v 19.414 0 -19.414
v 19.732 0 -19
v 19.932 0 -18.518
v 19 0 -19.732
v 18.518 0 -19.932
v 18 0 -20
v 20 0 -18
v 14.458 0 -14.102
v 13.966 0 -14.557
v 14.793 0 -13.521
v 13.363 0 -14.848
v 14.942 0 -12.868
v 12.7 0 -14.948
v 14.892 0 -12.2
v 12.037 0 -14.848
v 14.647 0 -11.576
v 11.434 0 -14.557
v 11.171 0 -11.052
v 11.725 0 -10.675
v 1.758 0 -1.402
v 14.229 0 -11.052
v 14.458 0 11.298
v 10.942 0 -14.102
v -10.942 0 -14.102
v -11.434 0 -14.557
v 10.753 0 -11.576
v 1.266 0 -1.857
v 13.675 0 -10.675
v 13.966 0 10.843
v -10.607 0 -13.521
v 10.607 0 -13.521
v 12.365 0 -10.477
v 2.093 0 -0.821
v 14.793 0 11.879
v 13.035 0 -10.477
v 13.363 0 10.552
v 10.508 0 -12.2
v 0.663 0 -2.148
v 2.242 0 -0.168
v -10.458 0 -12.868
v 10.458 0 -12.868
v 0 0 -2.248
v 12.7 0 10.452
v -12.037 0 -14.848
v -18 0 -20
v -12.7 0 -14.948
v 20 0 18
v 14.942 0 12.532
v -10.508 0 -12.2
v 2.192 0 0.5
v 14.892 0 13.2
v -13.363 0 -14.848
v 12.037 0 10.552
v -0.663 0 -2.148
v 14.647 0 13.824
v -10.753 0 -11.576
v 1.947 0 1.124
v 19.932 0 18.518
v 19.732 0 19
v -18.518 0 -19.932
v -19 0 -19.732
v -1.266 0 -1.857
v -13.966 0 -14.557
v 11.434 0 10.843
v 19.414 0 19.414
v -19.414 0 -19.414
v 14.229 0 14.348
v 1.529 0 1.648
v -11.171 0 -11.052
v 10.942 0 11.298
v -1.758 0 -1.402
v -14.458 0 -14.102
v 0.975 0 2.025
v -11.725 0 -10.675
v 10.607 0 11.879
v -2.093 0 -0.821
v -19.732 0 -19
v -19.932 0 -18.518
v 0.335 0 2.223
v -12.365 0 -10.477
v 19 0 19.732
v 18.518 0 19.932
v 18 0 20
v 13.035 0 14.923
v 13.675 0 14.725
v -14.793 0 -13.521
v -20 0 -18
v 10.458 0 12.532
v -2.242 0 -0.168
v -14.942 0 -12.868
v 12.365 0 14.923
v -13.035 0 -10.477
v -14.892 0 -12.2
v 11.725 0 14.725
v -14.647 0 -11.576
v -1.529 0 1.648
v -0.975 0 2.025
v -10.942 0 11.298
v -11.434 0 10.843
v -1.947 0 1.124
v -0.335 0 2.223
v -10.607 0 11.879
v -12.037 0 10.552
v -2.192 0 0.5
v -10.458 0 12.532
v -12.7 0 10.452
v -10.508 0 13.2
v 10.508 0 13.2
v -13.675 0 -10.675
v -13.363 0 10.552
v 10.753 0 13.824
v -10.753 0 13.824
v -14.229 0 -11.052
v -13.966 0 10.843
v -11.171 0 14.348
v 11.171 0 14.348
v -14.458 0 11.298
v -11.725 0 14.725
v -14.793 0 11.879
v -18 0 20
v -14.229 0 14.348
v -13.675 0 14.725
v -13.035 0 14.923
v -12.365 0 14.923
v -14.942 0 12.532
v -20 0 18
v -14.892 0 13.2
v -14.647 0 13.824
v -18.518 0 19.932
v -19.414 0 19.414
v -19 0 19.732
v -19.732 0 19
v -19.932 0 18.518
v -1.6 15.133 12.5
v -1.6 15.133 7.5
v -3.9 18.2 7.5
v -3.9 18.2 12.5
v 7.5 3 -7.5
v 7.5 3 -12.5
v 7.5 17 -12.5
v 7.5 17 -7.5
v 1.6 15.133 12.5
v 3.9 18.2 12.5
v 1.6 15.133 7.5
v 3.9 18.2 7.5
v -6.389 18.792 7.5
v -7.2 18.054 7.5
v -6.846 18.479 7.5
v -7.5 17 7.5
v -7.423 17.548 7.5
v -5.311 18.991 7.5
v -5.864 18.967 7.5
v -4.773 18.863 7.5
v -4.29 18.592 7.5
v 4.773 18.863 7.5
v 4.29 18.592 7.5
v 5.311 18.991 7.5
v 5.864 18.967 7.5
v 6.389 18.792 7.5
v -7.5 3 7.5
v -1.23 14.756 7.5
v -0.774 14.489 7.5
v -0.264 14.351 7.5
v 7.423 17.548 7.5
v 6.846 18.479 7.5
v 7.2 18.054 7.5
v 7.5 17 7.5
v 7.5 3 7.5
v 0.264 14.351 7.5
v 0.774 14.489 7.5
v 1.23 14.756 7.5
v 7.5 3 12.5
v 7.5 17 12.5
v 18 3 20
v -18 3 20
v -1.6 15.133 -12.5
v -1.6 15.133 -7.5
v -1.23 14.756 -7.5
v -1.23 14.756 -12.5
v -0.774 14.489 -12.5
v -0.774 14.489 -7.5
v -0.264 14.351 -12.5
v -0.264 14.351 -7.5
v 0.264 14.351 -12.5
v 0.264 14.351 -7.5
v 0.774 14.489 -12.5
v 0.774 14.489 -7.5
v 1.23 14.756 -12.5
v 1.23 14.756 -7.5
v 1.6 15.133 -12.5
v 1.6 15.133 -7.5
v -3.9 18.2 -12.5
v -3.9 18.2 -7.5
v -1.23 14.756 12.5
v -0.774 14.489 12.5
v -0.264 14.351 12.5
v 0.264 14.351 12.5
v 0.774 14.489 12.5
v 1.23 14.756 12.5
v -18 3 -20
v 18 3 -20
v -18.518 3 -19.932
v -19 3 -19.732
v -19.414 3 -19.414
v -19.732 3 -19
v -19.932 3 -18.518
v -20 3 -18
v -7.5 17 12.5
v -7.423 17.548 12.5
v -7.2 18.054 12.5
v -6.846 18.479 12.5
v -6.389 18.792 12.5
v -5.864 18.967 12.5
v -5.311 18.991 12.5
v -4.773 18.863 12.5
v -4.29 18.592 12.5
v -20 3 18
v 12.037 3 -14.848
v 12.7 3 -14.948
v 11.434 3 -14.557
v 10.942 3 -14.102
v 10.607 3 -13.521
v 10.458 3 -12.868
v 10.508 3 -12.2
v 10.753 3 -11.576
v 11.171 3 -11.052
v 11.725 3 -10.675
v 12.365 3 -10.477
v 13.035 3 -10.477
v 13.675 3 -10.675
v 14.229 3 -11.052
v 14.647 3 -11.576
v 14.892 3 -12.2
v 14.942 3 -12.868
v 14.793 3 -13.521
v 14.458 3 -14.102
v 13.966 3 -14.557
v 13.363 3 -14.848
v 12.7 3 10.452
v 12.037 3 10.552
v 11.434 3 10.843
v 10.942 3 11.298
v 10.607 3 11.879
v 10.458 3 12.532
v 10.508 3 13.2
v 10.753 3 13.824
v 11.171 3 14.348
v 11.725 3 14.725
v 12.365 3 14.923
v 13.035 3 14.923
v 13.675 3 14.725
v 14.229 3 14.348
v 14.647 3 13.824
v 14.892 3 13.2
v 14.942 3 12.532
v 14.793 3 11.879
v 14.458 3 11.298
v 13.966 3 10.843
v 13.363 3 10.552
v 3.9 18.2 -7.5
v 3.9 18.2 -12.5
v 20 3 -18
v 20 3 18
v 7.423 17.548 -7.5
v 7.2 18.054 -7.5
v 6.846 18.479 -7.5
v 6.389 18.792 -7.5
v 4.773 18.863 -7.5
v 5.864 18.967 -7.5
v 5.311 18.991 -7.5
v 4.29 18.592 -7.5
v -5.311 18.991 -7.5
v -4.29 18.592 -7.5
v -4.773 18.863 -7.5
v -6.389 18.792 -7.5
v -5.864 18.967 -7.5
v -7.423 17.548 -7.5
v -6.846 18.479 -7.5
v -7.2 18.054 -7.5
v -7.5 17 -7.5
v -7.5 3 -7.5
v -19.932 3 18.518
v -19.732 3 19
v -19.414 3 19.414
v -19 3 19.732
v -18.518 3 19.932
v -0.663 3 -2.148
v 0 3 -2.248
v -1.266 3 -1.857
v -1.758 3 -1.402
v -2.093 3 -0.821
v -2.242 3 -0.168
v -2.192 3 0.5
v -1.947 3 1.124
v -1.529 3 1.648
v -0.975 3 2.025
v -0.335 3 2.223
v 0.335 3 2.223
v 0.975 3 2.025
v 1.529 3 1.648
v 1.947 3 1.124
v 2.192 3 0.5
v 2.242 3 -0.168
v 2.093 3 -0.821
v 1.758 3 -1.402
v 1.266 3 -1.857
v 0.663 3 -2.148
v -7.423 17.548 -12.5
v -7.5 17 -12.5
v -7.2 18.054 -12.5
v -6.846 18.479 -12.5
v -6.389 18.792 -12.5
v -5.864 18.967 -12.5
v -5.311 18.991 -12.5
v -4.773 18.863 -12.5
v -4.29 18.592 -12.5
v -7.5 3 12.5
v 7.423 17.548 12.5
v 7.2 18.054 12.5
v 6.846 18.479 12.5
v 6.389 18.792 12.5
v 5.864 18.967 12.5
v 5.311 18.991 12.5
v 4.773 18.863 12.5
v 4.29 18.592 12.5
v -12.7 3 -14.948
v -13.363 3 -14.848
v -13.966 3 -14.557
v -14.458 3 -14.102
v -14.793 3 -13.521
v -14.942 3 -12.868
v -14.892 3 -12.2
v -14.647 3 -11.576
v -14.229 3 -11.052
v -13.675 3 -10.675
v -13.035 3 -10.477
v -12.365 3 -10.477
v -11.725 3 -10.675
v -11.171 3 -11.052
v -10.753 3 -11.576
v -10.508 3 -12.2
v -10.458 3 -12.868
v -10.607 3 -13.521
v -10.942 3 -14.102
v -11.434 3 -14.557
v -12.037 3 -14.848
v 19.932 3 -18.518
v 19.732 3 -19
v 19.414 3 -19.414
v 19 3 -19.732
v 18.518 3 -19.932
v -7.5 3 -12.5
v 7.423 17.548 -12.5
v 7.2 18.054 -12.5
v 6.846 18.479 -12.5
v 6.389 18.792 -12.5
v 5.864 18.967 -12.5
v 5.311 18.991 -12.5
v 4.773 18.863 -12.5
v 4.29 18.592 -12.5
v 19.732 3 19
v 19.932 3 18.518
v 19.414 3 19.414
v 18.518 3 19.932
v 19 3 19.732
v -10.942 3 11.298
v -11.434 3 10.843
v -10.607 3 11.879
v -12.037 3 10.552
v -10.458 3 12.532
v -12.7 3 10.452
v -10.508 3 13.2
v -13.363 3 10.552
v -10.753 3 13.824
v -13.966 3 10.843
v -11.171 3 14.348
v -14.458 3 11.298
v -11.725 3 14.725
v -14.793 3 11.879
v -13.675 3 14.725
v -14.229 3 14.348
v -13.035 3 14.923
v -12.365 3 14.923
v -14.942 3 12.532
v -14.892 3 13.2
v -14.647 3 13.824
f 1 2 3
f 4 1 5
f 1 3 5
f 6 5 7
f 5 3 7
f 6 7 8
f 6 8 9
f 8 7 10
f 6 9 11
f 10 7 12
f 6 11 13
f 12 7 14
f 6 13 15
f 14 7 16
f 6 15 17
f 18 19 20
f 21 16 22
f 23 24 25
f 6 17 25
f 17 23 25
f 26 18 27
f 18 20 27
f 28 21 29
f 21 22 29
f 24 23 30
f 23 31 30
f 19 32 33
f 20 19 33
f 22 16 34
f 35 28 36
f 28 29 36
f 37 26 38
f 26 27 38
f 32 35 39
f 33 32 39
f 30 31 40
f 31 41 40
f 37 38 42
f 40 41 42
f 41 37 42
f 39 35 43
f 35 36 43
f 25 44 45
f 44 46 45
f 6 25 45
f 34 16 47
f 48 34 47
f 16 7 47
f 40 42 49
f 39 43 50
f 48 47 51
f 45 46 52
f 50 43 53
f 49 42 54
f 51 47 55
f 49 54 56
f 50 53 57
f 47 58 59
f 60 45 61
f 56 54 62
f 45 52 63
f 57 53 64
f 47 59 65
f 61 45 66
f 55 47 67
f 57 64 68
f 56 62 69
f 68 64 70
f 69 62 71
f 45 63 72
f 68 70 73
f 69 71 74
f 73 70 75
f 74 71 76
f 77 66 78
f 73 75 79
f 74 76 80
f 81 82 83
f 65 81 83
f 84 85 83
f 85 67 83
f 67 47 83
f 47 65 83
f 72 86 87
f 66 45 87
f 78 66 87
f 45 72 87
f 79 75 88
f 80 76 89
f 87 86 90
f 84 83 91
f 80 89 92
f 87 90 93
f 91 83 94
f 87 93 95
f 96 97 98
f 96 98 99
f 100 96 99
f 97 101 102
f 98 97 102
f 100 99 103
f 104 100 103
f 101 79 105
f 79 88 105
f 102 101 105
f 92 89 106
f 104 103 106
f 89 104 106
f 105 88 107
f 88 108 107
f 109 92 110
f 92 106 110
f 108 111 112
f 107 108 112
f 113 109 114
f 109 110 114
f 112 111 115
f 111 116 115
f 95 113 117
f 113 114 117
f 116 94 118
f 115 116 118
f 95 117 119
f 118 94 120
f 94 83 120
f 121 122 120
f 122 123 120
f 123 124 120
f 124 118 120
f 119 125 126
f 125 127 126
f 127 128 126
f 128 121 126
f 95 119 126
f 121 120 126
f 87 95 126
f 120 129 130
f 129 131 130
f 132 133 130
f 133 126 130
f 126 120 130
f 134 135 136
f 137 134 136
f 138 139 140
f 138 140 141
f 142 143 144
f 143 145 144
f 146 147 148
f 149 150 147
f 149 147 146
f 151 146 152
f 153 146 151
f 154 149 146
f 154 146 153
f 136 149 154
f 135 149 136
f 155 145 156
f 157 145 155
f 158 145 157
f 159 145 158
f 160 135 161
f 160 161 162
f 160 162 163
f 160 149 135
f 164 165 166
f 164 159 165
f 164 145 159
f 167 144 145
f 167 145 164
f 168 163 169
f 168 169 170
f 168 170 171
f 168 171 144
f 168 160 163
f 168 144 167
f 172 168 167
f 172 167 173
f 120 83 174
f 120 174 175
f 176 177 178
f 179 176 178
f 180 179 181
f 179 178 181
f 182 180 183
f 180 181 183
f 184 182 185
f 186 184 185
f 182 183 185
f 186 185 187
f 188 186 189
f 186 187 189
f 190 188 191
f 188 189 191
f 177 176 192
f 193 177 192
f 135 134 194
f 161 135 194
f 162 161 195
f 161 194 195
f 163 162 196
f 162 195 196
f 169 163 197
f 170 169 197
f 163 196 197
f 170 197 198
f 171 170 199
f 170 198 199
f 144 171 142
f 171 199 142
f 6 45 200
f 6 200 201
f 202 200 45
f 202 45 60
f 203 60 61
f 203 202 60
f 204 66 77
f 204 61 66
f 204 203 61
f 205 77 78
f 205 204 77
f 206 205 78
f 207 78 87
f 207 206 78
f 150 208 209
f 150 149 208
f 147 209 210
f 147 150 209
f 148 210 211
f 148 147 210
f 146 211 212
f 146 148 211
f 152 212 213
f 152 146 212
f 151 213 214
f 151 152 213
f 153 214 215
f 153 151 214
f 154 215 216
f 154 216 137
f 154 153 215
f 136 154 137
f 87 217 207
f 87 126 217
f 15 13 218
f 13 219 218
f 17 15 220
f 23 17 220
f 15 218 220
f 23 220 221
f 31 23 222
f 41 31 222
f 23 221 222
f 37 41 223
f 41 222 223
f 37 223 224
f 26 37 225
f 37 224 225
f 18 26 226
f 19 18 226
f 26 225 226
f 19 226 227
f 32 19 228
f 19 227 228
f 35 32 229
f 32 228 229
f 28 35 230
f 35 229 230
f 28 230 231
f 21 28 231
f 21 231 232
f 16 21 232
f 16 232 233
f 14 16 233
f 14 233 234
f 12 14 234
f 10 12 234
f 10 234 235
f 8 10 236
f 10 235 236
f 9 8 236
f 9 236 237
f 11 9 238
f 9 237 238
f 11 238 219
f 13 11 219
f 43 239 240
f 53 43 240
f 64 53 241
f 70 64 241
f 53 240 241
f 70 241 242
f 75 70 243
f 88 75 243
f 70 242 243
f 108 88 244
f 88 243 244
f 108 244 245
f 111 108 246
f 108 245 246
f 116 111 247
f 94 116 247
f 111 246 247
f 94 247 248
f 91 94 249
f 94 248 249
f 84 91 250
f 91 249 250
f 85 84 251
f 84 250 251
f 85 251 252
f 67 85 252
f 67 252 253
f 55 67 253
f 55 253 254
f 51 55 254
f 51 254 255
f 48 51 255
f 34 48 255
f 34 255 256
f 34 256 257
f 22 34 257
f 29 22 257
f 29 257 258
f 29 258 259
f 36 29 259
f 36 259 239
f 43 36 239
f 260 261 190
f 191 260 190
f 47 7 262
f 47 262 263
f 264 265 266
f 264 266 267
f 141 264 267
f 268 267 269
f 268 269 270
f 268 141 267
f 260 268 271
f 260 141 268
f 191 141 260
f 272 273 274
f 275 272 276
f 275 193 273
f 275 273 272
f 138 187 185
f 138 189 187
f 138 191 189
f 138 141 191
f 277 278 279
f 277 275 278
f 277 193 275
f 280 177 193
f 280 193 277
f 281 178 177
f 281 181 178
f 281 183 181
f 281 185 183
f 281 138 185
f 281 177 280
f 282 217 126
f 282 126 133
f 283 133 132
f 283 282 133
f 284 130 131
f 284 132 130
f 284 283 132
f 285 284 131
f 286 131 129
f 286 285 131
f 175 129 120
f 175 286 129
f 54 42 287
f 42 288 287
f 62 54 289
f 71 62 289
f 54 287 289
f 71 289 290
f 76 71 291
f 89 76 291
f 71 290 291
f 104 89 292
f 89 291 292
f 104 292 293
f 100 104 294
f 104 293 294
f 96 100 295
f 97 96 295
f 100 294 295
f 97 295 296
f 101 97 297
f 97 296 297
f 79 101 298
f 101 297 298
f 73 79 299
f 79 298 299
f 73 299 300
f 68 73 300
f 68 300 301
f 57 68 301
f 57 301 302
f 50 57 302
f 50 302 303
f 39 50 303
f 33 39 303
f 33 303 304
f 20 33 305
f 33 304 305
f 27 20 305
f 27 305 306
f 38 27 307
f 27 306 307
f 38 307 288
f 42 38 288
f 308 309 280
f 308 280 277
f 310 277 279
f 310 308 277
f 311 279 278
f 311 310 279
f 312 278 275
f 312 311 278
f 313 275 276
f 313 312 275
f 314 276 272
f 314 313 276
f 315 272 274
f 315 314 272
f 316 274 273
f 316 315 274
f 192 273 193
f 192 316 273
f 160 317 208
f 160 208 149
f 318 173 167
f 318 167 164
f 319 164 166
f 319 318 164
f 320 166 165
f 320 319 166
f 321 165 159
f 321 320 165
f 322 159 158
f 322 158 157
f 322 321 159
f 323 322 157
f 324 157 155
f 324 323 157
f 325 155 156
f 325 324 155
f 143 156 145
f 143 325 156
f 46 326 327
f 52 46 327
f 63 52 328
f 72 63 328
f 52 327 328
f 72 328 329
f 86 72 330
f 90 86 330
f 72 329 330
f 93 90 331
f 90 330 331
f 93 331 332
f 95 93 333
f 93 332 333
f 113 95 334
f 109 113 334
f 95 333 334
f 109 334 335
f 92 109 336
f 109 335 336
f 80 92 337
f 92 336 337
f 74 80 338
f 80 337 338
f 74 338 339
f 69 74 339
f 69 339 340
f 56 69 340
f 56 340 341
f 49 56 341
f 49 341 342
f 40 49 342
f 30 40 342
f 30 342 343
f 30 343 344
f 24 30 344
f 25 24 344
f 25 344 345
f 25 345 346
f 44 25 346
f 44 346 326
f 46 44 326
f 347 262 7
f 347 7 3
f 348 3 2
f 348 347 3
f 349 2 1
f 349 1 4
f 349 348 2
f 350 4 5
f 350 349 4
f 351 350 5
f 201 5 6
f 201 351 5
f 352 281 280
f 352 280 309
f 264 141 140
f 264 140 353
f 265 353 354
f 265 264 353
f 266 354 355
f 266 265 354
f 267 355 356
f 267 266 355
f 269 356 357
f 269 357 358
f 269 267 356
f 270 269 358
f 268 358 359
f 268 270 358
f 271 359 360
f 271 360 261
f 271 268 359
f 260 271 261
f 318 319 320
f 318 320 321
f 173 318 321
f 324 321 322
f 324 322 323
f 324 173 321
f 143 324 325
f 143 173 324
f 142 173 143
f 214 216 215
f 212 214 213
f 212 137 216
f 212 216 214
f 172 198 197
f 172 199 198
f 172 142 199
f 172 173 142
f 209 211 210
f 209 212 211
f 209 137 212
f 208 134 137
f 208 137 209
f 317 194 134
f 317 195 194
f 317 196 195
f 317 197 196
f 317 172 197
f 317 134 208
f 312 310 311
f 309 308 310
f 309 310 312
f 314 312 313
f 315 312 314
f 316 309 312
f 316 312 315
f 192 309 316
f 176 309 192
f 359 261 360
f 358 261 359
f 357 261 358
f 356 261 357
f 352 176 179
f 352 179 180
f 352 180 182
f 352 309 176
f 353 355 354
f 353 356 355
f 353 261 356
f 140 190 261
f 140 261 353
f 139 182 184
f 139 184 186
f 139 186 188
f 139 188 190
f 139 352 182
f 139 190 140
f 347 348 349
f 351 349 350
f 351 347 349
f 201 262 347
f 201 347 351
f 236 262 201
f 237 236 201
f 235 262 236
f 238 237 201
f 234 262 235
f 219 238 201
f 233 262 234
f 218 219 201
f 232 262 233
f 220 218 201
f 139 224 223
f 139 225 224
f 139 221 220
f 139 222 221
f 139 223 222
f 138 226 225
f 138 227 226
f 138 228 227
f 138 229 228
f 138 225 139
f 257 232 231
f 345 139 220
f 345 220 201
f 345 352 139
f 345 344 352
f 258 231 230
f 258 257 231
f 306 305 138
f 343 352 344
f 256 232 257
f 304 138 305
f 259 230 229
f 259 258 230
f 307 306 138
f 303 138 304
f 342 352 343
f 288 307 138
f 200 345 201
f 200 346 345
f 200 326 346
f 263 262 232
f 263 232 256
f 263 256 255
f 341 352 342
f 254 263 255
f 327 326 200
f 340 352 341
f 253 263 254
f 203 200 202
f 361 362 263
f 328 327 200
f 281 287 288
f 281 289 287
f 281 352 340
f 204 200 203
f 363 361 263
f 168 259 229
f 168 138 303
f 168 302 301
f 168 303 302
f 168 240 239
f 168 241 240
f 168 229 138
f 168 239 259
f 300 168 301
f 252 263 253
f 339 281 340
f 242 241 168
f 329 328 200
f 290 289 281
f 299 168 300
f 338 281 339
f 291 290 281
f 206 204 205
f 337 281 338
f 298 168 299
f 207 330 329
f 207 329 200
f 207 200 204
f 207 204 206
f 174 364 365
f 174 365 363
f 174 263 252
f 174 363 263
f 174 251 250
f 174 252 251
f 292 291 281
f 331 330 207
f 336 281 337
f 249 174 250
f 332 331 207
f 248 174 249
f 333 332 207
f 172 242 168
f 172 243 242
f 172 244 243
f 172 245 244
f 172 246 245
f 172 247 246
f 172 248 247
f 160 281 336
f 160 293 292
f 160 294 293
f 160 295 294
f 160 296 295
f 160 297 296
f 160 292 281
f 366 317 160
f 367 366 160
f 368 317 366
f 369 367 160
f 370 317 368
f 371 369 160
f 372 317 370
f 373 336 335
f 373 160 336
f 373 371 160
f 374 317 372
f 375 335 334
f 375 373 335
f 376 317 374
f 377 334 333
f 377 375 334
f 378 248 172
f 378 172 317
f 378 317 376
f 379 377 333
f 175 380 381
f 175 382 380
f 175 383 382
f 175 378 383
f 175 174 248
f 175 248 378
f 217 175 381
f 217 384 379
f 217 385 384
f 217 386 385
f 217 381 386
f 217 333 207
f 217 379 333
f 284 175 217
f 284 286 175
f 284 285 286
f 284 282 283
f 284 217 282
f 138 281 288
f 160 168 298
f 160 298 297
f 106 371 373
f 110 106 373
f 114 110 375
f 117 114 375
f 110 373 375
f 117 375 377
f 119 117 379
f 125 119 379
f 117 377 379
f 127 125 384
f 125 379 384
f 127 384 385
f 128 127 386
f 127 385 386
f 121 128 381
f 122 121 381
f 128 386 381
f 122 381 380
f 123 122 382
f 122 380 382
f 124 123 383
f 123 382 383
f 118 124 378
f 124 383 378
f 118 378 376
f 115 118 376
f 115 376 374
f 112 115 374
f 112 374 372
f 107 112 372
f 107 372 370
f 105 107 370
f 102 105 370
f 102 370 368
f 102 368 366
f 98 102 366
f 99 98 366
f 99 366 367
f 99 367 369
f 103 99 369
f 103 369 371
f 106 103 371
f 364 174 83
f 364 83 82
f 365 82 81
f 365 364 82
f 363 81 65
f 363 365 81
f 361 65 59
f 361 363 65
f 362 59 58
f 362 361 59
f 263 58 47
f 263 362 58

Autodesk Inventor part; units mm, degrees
ref_plane "YZ Plane" through (0, 0, 0) normal (1, 0, 0) x (0, 1, 0)
ref_plane "XZ Plane" through (0, 0, 0) normal (0, 1, 0) x (-1, 0, 0)
ref_plane "XY Plane" through (0, 0, 0) normal (0, 0, 1) x (1, 0, 0)
sketch "Sketch1" plane through (0, 0, 0) normal (0, 1, 0) x (-1, 0, 0)
  line L0 (-20, 20) -> (20, 20)
  line L1 (20, 20) -> (20, -20)
  line L2 (20, -20) -> (-20, -20)
  line L3 (-20, -20) -> (-20, 20)
  line L4 (-20, 20) -> (20, -20) construction
  line L5 (20, 20) -> (-20, -20) construction
  point P0 (0, 0)
  dimension "d0" = 40
  dimension "d1" = 40
extrude "Extrusion1" add sketch "Sketch1" along normal blind 3
sketch "Sketch2" plane through (0, 3, 0) normal (0, 1, 0) x (1, 0, 0)
  line L0 (-7.5, 12.5) -> (7.5, 12.5)
  line L1 (7.5, 12.5) -> (7.5, 7.5)
  line L2 (7.5, 7.5) -> (-7.5, 7.5)
  line L3 (-7.5, 7.5) -> (-7.5, 12.5)
  line L4 (-7.5, -7.5) -> (7.5, -7.5)
  line L5 (7.5, -7.5) -> (7.5, -12.5)
  line L6 (7.5, -12.5) -> (-7.5, -12.5)
  line L7 (-7.5, -12.5) -> (-7.5, -7.5)
  line L8 (0, 7.5) -> (0, -7.5) construction
  point P0 (-20, 20)
  point P1 (20, 20)
  point P2 (0, 0)
  point P3 (0, 0)
  dimension "d10" = 15
  dimension "d11" = 15
  dimension "d12" = 5
extrude "Extrusion2" add sketch "Sketch2" along normal blind 20
sketch "Sketch3" plane through (20, 0, -20) normal (0, 0, -1) x (-1, 0, 0)
  line L0 (40, 0) -> (0, 0) projected
  line L1 (12.5, 23) -> (27.5, 23) projected
  line L2 (12.5, 3) -> (12.5, 23) projected
  line L3 (12.5, 23) -> (20, 13)
  line L4 (20, 13) -> (27.5, 23)
  point P0 (20, 0)
  point P1 (20, 0)
  point P2 (20, 0)
  dimension "d13" = 10
extrude "Extrusion3" cut sketch "Sketch3" against normal through all
fillet "Fillet1" radius 2 10 edges at (0, 13, 10) (0, 13, -10) (-7.5, 23, -10) (-7.5, 23, 10) (7.5, 23, 10) (7.5, 23, -10) (20, 1.5, 20) (20, 1.5, -20) (-20, 1.5, -20) (-20, 1.5, 20)
sketch "Sketch5" plane through (0, 0, 0) normal (0, -1, 0) x (1, 0, 0)
  line L0 (12.7, -12.7) -> (-12.7, -12.7) construction
  line L1 (-12.7, -12.7) -> (-12.7, 12.7) construction
  point P0 (0, 0)
  point P1 (12.7, 12.7)
  point P2 (0, -12.7)
  point P3 (-12.7, 0)
  point P4 (0, 0)
  dimension "d14" = 25.4
  dimension "d15" = 25.4
hole "Hole1" at (12.7, 0, -12.7) at (-12.7, 0, -12.7) at (12.7, 0, 12.7) at (-12.7, 0, 12.7) at (0, 0, 0) direction (0, 1, 0) diameter 4.496 end through all clearance for "Flat Head Machine Screw (82)" size "#8" standard "Ansi Unified Screw Threads"
properties part number "CapillaryHolder"
